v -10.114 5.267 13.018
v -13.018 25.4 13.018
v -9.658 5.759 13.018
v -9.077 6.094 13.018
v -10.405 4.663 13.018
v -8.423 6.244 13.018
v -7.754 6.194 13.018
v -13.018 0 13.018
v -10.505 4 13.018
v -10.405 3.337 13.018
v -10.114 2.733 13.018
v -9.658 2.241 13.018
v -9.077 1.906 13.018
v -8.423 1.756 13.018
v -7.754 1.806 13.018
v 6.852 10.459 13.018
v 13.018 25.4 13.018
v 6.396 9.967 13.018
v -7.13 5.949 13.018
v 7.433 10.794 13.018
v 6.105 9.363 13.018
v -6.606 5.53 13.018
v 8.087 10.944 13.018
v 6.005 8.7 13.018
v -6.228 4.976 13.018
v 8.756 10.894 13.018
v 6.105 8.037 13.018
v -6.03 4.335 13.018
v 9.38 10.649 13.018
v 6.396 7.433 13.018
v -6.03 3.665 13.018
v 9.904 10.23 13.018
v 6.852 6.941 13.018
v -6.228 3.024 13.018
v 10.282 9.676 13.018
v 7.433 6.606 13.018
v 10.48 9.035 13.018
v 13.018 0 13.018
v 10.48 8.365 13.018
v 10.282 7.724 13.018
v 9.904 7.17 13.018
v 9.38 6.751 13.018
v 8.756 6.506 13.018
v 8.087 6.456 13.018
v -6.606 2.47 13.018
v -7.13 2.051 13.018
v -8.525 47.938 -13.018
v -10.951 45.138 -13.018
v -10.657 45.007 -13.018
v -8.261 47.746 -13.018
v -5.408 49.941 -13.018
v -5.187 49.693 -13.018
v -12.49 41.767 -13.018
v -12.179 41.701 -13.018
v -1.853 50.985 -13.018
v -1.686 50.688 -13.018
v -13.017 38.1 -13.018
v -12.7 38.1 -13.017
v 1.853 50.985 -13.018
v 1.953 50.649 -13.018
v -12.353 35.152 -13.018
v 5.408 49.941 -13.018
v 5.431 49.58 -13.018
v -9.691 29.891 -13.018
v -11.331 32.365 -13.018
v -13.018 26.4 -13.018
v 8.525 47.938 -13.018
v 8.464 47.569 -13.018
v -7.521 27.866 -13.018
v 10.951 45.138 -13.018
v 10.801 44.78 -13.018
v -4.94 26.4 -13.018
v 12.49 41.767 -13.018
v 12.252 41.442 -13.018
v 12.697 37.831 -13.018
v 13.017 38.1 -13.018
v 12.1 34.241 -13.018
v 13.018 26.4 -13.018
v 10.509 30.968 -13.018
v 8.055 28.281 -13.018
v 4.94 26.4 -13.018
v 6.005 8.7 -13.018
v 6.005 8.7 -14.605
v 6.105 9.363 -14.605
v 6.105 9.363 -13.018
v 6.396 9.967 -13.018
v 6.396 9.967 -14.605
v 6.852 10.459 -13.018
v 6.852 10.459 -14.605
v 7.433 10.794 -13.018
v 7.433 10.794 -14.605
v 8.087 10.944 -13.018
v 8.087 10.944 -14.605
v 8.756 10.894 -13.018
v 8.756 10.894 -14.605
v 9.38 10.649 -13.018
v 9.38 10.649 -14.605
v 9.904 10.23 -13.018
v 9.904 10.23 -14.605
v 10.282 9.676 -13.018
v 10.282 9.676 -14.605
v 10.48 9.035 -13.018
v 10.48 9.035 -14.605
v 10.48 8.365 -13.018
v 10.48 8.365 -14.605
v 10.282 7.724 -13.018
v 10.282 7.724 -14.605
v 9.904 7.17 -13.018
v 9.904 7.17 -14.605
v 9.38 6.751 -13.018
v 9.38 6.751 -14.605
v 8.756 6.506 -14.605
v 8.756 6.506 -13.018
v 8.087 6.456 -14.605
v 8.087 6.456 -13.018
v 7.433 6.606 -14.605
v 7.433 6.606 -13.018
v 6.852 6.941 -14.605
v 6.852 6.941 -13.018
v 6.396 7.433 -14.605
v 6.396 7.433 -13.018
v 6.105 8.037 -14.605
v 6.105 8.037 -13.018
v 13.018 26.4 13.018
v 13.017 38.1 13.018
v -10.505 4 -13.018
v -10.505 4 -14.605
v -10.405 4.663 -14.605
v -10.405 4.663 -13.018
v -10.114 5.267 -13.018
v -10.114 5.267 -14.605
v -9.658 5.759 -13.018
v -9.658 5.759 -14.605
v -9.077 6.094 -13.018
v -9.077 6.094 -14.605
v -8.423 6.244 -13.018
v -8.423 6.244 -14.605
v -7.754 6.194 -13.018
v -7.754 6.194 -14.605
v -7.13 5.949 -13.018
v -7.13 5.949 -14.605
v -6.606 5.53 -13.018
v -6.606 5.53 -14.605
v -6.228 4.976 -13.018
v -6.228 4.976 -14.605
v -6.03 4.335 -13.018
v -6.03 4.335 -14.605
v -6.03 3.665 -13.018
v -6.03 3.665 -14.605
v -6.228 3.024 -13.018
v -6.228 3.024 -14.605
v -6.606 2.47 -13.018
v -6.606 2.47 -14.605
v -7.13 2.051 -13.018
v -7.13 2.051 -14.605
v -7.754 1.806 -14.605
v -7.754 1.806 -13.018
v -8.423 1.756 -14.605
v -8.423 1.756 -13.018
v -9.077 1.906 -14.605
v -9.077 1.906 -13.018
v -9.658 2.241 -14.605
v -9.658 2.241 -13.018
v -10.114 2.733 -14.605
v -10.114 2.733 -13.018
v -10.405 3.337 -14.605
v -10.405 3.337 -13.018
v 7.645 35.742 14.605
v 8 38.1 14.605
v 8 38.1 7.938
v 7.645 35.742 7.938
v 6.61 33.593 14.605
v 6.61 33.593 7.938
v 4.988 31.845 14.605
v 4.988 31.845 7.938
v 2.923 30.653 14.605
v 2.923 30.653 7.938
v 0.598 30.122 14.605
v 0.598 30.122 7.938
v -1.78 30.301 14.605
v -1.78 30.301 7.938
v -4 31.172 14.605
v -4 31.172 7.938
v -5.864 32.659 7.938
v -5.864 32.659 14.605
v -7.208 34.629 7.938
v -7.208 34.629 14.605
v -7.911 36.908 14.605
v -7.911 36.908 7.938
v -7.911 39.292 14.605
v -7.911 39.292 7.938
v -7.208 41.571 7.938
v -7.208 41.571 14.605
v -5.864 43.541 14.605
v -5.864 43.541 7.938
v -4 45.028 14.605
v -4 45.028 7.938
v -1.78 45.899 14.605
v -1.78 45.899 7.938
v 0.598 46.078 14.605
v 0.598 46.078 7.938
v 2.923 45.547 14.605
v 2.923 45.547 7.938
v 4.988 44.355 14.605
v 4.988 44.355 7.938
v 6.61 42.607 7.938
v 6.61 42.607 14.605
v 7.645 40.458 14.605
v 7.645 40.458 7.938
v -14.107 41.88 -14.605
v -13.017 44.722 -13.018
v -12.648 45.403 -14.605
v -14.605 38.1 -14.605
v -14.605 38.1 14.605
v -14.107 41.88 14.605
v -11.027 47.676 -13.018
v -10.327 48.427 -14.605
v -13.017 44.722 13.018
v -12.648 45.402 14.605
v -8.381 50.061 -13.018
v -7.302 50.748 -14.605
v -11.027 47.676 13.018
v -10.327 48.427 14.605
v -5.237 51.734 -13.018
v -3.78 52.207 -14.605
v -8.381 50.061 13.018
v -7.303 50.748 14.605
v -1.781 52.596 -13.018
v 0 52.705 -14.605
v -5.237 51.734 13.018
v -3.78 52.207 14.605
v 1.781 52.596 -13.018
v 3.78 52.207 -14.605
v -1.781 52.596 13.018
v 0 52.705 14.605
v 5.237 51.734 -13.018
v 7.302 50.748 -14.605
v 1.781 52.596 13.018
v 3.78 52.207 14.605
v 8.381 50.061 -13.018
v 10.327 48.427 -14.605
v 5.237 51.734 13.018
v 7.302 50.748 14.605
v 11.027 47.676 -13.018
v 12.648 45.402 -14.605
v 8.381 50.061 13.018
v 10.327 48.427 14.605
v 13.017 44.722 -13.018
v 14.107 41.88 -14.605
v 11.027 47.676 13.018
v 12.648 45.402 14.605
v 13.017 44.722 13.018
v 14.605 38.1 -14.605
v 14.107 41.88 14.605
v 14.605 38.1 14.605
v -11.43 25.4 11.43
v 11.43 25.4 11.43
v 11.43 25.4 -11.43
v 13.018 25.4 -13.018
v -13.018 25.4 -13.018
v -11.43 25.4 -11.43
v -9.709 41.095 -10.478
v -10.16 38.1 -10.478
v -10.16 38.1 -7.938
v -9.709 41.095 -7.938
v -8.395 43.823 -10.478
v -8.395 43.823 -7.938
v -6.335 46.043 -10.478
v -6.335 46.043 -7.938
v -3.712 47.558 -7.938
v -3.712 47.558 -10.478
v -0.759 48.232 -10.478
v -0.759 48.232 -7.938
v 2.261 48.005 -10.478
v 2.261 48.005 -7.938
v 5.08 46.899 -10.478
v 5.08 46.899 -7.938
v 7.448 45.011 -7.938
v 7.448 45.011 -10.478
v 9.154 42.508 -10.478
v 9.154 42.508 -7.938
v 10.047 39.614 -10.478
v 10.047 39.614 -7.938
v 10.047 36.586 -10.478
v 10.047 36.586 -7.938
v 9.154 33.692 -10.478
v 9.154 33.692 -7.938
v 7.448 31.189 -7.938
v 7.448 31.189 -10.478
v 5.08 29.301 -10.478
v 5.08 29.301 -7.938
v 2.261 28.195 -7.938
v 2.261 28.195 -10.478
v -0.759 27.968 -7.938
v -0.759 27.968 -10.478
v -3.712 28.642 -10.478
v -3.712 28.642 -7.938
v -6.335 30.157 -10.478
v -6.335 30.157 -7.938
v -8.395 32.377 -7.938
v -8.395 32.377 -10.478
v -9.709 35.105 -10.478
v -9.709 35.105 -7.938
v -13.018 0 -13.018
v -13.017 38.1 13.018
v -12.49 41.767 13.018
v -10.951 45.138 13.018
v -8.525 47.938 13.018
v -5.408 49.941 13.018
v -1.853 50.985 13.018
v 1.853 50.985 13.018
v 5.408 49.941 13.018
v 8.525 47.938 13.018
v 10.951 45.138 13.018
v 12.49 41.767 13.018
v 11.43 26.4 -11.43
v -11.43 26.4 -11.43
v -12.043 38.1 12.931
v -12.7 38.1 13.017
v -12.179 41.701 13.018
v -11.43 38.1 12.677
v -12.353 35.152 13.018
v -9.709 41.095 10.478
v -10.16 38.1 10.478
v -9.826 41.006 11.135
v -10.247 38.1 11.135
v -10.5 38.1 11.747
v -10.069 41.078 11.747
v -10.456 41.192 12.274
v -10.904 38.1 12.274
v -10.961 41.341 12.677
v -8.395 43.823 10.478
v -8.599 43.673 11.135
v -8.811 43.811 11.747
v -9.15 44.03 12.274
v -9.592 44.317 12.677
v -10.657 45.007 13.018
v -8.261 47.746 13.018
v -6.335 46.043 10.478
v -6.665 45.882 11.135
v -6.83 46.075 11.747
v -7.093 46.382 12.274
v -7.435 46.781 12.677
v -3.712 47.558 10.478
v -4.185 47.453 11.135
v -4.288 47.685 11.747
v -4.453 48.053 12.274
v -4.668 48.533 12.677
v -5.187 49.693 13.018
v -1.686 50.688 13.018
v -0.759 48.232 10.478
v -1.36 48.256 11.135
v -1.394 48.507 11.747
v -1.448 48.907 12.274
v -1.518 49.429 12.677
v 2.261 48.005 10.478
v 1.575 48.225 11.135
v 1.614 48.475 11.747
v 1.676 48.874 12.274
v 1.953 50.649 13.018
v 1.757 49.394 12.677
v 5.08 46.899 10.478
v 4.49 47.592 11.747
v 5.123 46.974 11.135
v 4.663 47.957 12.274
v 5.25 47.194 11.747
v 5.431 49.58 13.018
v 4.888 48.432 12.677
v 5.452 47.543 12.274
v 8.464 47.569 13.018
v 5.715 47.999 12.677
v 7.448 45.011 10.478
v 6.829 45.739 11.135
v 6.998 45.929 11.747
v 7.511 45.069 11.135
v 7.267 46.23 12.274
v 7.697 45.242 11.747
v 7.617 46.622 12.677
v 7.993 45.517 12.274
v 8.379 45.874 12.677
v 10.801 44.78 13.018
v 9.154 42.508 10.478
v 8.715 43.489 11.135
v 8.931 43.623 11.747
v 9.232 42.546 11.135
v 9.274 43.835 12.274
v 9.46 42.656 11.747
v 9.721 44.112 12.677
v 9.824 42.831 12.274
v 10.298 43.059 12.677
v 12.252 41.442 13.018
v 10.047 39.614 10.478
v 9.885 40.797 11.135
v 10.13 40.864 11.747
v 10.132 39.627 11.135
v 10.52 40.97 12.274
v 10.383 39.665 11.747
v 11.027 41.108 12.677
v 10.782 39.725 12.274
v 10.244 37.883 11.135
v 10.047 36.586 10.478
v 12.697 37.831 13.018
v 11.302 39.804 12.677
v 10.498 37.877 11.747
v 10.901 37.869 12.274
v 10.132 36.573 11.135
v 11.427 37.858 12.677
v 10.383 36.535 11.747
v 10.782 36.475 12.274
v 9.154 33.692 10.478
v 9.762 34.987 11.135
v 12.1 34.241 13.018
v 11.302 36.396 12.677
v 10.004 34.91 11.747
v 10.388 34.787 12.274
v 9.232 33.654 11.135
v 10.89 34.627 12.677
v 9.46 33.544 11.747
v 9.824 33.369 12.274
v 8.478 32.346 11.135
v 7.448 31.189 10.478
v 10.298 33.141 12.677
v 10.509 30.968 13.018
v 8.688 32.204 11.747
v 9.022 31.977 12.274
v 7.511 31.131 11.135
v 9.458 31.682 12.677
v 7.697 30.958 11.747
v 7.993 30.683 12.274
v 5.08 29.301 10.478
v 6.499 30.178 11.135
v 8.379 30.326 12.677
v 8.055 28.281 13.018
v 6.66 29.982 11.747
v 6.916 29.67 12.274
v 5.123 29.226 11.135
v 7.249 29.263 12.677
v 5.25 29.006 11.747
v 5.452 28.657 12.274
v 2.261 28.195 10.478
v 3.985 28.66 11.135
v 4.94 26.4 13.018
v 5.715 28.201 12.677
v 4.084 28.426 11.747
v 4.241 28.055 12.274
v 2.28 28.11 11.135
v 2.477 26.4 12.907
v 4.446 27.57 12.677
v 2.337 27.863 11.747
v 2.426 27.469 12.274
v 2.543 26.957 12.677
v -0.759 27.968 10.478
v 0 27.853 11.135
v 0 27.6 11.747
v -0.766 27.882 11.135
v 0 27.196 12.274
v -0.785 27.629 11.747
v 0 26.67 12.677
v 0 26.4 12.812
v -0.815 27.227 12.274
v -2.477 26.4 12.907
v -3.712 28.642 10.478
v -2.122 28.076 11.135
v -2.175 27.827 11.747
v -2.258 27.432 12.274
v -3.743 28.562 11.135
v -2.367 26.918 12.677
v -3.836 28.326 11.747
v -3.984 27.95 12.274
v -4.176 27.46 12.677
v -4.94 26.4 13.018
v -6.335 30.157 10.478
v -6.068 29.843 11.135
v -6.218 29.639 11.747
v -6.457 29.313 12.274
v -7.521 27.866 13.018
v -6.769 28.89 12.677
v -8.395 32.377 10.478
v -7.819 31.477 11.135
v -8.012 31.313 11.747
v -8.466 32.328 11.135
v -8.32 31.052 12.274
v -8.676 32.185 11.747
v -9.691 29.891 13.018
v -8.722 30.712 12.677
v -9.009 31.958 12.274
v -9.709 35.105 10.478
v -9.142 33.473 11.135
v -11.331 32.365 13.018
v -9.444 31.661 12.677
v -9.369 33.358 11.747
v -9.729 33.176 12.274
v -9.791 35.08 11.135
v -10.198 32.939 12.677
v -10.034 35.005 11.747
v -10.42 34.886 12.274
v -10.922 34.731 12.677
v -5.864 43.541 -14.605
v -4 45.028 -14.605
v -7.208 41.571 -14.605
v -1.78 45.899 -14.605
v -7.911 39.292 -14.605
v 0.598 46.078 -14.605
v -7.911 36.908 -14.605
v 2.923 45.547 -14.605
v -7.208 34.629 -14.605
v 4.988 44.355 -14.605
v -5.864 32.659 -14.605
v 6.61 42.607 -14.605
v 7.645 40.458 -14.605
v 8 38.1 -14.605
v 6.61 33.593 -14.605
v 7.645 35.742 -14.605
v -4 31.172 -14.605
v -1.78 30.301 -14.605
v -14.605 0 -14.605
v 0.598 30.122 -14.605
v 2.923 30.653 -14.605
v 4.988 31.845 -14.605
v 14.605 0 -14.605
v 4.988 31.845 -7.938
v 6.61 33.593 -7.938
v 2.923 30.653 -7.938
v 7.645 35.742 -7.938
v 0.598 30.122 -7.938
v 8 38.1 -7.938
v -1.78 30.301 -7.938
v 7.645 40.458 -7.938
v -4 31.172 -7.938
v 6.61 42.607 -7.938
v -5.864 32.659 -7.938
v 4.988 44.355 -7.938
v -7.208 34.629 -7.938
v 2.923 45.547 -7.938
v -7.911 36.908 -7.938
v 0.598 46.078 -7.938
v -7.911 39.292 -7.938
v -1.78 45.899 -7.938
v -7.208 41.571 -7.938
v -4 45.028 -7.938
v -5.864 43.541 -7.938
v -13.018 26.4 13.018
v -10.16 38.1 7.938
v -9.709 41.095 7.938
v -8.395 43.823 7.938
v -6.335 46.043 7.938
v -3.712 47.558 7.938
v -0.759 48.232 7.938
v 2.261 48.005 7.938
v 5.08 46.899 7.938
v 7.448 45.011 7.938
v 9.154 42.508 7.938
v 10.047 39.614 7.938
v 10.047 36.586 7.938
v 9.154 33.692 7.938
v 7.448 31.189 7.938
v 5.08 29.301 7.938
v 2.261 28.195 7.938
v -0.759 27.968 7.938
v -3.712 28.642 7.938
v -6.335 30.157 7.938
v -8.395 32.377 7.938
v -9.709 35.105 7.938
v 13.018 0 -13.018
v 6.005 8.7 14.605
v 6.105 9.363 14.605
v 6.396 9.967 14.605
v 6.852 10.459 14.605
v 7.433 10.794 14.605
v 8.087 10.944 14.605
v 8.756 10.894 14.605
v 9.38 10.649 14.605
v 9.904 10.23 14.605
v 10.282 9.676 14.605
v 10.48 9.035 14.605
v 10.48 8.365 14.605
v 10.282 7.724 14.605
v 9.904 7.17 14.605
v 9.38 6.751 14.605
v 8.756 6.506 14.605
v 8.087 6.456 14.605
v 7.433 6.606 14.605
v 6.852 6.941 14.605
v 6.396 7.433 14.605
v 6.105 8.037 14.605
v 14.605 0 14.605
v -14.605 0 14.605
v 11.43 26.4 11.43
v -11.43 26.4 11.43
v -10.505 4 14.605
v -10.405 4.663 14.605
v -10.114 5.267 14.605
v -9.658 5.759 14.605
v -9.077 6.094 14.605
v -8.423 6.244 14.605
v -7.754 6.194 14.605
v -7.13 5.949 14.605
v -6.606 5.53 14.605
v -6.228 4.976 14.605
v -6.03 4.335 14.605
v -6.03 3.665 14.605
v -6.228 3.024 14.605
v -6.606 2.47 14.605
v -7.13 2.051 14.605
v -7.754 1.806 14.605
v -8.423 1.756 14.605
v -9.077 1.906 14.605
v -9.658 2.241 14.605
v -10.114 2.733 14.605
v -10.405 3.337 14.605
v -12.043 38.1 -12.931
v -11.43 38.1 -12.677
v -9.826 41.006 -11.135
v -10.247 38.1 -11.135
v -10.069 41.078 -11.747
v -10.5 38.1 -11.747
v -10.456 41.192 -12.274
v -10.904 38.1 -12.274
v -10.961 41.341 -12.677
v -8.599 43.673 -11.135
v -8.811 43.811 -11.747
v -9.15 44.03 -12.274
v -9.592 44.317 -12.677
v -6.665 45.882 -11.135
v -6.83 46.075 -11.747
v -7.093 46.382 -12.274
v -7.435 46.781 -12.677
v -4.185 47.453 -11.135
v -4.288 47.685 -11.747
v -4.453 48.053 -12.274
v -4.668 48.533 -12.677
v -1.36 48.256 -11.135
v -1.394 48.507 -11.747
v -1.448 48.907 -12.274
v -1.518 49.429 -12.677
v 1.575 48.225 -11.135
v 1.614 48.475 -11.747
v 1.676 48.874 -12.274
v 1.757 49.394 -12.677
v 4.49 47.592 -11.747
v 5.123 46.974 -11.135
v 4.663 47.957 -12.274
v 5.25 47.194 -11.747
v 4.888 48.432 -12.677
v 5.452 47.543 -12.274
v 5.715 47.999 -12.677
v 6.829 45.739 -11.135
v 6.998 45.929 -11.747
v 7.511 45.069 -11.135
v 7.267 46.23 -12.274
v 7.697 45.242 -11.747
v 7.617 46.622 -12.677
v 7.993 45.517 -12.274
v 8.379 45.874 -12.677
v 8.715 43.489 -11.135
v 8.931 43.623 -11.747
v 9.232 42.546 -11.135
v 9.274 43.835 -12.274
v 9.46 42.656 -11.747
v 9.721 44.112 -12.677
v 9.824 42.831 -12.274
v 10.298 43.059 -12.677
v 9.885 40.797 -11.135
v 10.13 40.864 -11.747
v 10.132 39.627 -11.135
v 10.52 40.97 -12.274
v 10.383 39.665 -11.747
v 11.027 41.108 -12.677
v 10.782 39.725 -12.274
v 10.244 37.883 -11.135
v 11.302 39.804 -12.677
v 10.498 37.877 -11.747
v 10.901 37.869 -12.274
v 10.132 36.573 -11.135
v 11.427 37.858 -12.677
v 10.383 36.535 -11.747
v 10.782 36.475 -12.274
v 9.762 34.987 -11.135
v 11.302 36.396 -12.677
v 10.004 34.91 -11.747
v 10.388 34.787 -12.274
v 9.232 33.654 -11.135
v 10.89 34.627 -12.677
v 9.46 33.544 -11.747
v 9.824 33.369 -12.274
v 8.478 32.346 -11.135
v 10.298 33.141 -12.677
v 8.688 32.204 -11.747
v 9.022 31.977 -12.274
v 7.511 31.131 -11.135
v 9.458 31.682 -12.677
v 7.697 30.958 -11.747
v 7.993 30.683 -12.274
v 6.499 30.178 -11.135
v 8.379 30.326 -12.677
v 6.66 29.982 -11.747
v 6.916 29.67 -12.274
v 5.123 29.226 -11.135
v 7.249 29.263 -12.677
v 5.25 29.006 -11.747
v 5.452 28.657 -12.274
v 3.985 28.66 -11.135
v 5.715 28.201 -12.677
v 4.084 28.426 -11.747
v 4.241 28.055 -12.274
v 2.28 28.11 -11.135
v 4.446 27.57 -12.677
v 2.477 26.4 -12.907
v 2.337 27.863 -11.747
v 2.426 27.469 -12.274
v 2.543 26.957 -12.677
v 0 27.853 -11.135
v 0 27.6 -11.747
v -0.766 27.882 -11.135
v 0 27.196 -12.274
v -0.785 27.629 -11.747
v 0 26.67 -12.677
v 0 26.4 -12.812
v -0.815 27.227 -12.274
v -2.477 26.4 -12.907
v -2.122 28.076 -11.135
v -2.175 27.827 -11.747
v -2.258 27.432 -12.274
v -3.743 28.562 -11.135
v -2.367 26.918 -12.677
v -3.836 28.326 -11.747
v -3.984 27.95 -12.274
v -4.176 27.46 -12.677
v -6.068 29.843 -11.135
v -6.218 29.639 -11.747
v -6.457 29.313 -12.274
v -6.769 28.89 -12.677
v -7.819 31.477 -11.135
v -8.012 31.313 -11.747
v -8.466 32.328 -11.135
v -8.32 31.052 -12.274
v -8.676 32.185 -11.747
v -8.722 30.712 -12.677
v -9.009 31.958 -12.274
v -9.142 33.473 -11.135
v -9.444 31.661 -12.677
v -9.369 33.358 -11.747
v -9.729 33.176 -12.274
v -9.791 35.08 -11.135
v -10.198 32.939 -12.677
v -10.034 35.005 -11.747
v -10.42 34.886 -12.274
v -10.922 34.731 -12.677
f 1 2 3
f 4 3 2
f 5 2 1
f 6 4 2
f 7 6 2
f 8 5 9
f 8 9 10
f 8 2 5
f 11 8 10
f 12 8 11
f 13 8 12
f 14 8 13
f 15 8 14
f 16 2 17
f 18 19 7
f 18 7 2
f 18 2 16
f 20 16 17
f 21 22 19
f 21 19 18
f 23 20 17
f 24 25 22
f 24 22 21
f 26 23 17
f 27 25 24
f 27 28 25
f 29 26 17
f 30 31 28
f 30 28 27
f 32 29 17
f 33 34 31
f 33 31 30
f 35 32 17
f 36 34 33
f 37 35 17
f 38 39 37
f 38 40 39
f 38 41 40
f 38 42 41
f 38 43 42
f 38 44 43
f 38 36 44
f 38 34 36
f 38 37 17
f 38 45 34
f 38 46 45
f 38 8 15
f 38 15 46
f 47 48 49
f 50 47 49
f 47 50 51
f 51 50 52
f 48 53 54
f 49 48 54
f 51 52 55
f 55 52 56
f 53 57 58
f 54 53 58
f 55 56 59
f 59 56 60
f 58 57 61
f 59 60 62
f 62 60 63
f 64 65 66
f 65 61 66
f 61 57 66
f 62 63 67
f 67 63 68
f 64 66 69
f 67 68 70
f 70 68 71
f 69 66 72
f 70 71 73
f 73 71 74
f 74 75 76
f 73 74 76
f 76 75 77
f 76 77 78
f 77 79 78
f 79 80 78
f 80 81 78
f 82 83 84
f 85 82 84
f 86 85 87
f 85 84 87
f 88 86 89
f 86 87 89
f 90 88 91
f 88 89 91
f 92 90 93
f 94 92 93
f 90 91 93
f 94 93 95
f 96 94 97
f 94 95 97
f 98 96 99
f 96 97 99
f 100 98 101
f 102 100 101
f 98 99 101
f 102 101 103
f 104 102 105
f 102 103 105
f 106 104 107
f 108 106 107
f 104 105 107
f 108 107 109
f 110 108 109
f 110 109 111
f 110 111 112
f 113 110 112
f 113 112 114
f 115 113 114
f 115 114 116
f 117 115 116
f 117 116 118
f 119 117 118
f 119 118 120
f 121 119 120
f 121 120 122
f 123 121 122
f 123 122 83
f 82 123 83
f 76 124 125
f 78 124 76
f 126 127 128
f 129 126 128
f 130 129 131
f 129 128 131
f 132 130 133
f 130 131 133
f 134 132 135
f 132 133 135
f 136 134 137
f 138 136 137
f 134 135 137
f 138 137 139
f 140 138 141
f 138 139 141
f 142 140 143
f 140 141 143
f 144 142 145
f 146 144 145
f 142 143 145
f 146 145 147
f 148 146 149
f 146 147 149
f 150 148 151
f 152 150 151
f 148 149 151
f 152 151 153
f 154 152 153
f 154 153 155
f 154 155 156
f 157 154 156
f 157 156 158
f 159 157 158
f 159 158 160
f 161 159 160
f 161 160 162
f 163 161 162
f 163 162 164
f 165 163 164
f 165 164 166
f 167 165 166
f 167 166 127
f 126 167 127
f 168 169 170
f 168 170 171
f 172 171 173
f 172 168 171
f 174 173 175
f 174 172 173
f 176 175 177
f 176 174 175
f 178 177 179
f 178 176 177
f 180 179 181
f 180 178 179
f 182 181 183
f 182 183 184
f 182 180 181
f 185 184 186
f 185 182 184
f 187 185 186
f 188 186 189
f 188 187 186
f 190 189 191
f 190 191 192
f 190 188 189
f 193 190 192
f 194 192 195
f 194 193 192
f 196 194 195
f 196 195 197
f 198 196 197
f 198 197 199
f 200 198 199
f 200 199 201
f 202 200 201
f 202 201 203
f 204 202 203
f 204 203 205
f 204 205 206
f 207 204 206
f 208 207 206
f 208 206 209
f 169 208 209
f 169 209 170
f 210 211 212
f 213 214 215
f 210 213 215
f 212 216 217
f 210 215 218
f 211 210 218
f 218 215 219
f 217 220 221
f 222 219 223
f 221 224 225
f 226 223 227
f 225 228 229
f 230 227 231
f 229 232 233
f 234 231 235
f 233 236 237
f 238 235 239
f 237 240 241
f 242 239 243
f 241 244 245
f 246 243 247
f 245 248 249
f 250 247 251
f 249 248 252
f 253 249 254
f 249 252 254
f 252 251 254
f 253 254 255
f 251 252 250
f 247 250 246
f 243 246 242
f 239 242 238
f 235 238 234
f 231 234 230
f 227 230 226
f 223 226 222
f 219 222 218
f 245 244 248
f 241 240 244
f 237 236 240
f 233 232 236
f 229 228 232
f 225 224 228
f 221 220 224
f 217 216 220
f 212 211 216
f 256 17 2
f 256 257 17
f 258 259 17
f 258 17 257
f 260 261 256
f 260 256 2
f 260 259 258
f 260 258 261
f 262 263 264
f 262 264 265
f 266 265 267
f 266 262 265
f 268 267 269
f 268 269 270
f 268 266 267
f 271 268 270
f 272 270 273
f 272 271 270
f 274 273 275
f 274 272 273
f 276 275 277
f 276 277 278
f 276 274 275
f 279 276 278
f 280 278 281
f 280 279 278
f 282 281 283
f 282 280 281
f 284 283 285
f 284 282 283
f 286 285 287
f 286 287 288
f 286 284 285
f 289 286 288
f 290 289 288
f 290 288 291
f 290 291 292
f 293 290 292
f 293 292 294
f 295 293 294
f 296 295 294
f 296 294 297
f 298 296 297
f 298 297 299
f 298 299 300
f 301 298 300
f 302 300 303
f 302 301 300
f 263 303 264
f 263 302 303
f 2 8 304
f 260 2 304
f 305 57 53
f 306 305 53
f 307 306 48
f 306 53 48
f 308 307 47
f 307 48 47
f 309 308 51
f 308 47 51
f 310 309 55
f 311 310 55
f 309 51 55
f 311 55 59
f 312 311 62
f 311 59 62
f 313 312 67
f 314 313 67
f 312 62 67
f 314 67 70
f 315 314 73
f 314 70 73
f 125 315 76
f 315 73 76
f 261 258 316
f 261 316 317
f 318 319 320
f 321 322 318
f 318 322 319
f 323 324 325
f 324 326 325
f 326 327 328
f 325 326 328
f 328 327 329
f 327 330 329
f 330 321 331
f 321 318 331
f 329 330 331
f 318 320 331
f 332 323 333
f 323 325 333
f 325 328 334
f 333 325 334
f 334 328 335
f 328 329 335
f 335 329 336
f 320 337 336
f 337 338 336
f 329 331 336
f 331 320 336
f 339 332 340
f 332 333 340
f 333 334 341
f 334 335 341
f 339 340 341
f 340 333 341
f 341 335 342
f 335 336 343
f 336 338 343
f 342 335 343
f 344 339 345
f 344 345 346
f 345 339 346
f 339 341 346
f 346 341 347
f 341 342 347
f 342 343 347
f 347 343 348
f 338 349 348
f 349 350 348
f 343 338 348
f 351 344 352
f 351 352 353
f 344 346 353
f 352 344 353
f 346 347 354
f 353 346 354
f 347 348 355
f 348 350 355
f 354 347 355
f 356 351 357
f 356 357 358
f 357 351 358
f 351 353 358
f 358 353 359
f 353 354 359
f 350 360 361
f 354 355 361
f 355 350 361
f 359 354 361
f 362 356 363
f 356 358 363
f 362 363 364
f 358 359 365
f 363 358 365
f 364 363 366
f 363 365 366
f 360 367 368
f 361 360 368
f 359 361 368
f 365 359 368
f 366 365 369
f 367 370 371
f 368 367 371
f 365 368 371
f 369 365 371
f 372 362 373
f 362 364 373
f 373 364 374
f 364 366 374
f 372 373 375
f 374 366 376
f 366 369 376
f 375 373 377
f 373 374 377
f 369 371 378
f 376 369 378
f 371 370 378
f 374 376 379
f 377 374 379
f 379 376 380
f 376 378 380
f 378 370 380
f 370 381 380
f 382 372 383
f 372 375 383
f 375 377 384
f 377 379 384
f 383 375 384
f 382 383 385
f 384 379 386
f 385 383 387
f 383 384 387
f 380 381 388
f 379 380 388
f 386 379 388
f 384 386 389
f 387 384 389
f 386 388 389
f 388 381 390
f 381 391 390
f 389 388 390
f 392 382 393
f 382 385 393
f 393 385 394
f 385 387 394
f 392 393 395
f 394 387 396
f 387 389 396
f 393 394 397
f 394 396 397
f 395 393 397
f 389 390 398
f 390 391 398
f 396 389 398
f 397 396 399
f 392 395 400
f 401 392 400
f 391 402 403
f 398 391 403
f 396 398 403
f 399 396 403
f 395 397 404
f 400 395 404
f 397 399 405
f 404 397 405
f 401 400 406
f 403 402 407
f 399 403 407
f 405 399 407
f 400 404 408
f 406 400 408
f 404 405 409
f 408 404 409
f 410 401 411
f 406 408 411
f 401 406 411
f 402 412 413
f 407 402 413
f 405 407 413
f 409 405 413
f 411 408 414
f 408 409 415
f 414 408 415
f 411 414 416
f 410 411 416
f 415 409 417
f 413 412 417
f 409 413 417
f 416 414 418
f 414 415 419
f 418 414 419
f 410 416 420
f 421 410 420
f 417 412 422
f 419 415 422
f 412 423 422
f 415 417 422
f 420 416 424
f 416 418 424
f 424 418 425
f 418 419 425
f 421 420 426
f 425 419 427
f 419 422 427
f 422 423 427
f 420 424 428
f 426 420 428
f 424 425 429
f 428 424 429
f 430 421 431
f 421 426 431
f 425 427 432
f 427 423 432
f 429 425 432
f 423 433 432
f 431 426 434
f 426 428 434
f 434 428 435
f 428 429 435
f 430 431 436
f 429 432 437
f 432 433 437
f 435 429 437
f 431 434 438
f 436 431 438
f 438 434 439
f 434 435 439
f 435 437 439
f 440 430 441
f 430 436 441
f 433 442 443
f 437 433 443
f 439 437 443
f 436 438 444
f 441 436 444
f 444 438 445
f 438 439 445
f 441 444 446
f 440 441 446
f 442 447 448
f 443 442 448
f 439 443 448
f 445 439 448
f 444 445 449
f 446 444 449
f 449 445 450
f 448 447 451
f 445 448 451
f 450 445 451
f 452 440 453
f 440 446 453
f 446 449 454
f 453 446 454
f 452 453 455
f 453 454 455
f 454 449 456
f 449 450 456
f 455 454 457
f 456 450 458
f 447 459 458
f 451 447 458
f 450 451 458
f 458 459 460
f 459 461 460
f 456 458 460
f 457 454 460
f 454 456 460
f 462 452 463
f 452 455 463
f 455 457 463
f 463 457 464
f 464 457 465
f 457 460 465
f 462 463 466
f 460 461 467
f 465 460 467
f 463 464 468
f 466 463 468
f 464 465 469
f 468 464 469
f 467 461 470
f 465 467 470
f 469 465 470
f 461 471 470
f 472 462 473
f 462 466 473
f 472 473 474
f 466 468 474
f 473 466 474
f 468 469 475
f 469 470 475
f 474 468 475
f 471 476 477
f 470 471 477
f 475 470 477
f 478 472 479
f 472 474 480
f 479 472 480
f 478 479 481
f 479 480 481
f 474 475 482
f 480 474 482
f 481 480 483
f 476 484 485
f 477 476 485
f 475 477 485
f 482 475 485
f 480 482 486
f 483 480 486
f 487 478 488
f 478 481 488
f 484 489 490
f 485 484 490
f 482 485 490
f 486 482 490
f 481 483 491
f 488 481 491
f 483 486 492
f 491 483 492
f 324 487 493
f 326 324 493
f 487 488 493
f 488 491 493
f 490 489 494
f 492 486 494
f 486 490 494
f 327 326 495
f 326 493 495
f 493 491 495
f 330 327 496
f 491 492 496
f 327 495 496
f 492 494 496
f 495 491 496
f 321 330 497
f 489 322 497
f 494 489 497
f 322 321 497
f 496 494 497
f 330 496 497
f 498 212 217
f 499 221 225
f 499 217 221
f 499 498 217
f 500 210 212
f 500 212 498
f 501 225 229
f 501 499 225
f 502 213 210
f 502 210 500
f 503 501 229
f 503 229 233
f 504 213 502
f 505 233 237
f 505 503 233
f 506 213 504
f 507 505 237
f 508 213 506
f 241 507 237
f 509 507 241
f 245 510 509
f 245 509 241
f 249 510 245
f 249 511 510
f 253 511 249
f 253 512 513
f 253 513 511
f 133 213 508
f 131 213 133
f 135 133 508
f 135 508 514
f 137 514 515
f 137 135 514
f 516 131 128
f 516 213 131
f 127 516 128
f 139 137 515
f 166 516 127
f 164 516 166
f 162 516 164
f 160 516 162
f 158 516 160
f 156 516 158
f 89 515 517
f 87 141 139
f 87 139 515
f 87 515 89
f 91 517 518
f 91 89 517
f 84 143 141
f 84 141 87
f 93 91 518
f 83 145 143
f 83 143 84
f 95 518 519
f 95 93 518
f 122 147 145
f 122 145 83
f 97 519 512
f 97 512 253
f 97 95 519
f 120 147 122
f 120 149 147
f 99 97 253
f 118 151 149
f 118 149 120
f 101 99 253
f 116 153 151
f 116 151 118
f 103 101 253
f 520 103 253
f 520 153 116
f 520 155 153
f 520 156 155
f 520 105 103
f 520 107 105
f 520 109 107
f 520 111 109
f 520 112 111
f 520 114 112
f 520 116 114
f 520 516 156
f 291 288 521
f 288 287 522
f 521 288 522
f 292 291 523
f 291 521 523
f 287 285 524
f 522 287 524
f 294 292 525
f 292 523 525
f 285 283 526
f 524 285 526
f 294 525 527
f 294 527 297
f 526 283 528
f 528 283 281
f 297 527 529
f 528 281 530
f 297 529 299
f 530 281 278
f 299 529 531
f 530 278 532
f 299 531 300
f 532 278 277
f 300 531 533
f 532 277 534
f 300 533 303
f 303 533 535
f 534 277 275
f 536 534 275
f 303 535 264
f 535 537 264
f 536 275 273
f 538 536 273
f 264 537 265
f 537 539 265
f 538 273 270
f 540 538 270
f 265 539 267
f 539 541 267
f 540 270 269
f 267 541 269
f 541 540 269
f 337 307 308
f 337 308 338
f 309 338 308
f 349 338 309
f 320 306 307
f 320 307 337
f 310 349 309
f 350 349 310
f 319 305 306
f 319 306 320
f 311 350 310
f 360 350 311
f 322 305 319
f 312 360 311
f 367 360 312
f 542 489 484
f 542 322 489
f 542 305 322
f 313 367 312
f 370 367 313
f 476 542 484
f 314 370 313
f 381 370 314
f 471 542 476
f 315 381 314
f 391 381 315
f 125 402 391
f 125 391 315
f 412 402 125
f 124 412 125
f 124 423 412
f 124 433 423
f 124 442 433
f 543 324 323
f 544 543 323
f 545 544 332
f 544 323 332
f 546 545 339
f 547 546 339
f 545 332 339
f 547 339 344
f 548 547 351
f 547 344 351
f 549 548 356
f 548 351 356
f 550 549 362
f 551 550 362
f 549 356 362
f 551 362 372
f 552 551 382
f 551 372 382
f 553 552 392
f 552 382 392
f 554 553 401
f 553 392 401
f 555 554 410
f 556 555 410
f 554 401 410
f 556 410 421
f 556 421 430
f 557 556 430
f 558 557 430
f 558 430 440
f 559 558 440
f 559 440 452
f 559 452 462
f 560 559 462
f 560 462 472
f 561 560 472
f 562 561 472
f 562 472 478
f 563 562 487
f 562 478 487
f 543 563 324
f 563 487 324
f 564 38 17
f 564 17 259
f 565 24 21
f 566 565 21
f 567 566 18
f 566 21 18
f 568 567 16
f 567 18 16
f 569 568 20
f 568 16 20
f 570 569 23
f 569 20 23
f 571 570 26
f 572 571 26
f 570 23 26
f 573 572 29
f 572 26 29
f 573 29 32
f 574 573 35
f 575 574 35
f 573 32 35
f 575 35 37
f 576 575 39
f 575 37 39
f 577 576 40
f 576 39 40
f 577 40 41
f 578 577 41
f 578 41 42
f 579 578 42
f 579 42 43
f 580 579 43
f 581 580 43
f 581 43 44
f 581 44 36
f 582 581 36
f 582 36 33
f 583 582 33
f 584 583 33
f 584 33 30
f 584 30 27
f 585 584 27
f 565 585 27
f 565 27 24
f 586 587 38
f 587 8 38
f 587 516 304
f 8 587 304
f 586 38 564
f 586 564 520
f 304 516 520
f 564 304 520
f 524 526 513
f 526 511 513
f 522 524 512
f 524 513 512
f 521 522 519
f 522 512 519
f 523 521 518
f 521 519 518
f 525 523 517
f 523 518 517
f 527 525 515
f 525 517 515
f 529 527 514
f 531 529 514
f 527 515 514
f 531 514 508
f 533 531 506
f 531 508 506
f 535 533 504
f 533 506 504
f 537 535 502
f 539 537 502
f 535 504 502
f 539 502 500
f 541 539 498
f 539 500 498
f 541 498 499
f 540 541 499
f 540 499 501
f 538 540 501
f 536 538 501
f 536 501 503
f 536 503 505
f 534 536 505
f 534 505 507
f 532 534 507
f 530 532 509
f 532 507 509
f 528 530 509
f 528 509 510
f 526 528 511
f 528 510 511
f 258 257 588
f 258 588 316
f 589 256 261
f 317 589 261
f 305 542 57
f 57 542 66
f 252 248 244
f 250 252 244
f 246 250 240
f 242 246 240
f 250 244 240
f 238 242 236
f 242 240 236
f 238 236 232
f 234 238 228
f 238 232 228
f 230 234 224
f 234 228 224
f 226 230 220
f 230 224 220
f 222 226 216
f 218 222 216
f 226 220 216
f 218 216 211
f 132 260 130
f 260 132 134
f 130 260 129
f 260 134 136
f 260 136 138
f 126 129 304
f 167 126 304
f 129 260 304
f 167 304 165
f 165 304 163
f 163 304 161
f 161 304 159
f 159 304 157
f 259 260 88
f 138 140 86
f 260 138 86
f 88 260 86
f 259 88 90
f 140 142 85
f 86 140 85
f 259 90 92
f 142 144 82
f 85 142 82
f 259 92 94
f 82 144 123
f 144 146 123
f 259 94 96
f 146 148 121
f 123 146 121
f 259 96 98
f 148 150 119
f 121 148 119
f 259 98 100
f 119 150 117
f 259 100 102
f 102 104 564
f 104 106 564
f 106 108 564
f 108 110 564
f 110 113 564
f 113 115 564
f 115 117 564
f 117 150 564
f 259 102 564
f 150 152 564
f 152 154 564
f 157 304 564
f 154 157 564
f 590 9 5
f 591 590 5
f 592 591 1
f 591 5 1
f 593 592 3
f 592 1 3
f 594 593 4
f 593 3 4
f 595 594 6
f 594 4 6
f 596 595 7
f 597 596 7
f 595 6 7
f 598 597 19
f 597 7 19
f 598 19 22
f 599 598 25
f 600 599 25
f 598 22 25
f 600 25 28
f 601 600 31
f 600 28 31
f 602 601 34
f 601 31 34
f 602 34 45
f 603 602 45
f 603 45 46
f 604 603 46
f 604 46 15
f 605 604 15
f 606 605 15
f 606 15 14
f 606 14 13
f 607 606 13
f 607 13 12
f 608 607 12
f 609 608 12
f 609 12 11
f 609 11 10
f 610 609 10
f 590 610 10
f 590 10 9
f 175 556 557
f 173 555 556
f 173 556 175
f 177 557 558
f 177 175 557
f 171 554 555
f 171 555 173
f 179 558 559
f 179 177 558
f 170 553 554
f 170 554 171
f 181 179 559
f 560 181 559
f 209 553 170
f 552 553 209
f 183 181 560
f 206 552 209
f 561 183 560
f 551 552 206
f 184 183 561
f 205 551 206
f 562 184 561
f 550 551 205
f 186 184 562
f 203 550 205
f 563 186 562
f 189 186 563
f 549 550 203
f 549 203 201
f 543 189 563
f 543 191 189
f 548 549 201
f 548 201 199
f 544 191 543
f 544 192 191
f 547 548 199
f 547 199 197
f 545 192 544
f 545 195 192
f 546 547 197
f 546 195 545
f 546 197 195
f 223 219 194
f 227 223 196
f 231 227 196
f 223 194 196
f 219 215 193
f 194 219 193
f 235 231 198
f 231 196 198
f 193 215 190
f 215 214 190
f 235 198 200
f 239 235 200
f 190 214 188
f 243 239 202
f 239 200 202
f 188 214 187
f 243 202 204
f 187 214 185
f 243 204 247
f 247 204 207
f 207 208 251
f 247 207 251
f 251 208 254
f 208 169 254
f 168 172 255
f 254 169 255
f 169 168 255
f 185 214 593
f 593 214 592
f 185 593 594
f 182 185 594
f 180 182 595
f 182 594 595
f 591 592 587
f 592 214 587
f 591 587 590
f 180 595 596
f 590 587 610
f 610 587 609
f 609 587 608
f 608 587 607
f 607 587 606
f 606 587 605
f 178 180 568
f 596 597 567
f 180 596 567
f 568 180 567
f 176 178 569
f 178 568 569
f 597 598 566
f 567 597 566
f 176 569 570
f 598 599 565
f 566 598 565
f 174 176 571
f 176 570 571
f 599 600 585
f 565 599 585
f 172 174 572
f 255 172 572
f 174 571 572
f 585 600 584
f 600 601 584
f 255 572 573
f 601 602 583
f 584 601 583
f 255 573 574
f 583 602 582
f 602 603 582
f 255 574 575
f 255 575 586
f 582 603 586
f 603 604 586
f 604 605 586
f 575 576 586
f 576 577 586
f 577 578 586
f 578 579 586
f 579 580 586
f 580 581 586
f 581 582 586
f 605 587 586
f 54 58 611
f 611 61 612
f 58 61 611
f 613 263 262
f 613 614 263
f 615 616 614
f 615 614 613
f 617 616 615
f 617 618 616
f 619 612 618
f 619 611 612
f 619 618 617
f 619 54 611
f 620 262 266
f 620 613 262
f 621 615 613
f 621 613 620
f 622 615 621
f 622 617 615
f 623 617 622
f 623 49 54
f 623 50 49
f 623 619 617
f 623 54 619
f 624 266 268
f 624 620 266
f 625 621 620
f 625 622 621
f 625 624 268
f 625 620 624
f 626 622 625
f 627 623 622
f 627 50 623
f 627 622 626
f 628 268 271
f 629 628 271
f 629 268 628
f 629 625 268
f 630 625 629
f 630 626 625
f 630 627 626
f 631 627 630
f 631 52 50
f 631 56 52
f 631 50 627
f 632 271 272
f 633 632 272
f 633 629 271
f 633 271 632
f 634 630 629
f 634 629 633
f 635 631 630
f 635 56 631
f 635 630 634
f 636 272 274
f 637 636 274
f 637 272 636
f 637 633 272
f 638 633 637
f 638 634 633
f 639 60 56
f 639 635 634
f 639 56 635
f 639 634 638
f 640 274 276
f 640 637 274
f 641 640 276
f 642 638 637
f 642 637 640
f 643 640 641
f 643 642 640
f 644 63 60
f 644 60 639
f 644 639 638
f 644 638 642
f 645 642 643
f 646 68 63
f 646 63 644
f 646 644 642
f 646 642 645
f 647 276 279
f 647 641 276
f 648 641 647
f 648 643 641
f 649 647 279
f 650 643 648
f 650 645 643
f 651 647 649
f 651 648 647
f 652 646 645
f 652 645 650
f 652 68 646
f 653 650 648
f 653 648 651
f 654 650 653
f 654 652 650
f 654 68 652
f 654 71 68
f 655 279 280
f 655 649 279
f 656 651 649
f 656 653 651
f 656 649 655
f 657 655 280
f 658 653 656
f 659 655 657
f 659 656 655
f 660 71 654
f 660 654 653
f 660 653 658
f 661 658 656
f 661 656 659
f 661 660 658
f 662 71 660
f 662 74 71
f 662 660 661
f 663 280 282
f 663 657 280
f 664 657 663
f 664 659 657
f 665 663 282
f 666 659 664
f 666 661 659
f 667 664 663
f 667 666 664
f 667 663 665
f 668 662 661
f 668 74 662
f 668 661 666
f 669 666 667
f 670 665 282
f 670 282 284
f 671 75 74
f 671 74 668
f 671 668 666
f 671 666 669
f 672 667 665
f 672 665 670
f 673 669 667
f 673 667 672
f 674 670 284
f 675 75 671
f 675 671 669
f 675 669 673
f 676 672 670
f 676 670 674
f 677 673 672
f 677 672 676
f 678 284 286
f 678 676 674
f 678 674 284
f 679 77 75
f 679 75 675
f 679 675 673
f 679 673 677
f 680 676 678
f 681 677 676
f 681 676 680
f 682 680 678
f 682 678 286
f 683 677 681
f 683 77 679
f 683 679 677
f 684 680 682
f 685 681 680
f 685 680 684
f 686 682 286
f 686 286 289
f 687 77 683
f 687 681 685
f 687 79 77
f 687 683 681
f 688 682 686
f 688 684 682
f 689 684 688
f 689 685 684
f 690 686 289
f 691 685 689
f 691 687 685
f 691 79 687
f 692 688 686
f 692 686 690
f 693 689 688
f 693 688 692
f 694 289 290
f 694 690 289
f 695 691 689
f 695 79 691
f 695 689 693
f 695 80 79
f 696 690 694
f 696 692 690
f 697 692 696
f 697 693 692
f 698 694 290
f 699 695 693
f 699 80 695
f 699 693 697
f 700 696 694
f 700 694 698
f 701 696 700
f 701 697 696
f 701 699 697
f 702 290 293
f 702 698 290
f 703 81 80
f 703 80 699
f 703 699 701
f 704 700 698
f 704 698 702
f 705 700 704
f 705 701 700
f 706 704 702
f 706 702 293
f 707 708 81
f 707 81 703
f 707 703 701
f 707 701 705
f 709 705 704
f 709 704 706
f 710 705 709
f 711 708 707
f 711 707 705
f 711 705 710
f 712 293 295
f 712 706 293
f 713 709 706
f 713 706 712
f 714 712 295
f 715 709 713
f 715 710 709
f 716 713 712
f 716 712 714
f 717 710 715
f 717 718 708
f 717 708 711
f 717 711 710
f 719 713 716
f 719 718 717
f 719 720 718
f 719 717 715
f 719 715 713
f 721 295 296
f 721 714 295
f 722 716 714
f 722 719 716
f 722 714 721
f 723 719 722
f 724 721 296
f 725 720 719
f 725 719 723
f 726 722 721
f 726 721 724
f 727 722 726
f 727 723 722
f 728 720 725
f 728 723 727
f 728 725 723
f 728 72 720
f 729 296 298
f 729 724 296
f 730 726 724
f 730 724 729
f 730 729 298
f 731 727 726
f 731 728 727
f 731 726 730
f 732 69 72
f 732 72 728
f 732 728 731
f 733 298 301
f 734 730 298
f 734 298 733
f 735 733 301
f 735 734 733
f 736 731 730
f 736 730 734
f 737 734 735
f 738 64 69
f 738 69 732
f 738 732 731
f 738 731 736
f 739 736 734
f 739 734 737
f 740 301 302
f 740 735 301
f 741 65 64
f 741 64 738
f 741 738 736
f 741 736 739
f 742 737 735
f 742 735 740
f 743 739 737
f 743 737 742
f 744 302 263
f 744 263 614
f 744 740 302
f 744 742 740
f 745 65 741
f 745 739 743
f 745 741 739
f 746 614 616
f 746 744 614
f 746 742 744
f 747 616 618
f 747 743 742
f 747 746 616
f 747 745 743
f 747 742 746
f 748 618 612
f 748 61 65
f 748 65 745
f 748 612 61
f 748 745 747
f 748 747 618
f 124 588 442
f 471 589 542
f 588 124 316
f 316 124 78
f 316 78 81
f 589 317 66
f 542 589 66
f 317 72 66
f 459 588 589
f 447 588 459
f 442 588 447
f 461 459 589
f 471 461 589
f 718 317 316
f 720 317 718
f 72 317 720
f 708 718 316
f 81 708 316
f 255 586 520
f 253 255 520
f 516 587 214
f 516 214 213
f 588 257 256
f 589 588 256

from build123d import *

# Parameters (mm, degrees)
SKETCH1_W           = 29.21
SKETCH1_H           = 29.21
SKETCH1_W_2         = 26.035
SKETCH1_H_2         = 26.035
BOSS_EXTRUDE1_DEPTH = 101.6
SKETCH2_R           = 8
CUT_EXTRUDE1_DEPTH  = 50.8
BOSS_EXTRUDE2_DEPTH = 26.035
SKETCH6_R           = 10.16
SKETCH6_R_2         = 8
BOSS_EXTRUDE3_DEPTH = 5.08
FILLET1_R           = 2.54
SKETCH7_R           = 2.25
CUT_EXTRUDE2_DEPTH  = 46.736
SKETCH8_W           = 26.035
SKETCH8_H           = 26.035
SKETCH8_W_2         = 22.86
SKETCH8_H_2         = 22.86
BOSS_EXTRUDE4_DEPTH = 1


with BuildPart() as part:
    # Sketch1 → Boss-Extrude1 (new body)
    with BuildSketch(Plane(origin=(0, 0, 0), x_dir=(1, 0, 0), z_dir=(0, 1, 0))):
        Rectangle(SKETCH1_W, SKETCH1_H)
        Rectangle(SKETCH1_W_2, SKETCH1_H_2, mode=Mode.SUBTRACT)
    extrude(amount=BOSS_EXTRUDE1_DEPTH)

    # Sketch2 → Cut-Extrude1 (cut)
    with BuildSketch(Plane.XY.offset(14.605)):
        with BuildLine():
            Line((-14.605, 101.6), (-14.605, 38.1))
            ThreePointArc((-14.605, 38.1), (0, 52.705), (14.605, 38.1))
            Line((14.605, 38.1), (14.605, 101.6))
            Line((14.605, 101.6), (-14.605, 101.6))
        make_face()
        with Locations((0, 38.1)):
            Circle(SKETCH2_R)
    extrude(amount=-CUT_EXTRUDE1_DEPTH, mode=Mode.SUBTRACT)

    # Sketch5 → Boss-Extrude2 (add)
    with BuildSketch(Plane.XY.offset(-13.0175)):
        with BuildLine():
            Line((-13.0175, 44.721987523), (-13.0175, 38.1))
            ThreePointArc((-13.0175, 38.1), (0, 51.1175), (13.0175, 38.1))
            Line((13.0175, 38.1), (13.0175, 44.721987523))
            ThreePointArc((13.0175, 44.721987523), (0, 52.705), (-13.0175, 44.721987523))
        make_face()
    extrude(amount=BOSS_EXTRUDE2_DEPTH)

    # Sketch6 → Boss-Extrude3 (add)
    with BuildSketch(Plane(origin=(0, 0, 13.0175), x_dir=(-1, 0, 0), z_dir=(0, 0, -1))):
        with Locations((0, 38.1)):
            Circle(SKETCH6_R)
        with Locations(Location((0, 38.1, 0), (0, 0, 180))):
            Circle(SKETCH6_R_2, mode=Mode.SUBTRACT)
    extrude(amount=BOSS_EXTRUDE3_DEPTH)

    # Fillet1
    fillet1_edges = [part.edges().sort_by_distance(p)[0] for p in [
        (10.16, 38.1, 13.0175),
    ]]
    fillet(fillet1_edges, radius=FILLET1_R)

    # Mirror7: part across plane


with BuildPart() as part_1:
    add(part.part)
    add(part.part.mirror(Plane.XY))

    # Sketch7 → Cut-Extrude2 (cut)
    with BuildSketch(Plane(origin=(0, 0, -14.605), x_dir=(-1, 0, 0), z_dir=(0, 0, -1))):
        with Locations((-8.255, 8.7)):
            Circle(SKETCH7_R)
        with Locations((8.255, 4)):
            Circle(SKETCH7_R)
    extrude(amount=-CUT_EXTRUDE2_DEPTH, mode=Mode.SUBTRACT)

    # Sketch8 → Boss-Extrude4 (add)
    with BuildSketch(Plane(origin=(0, 25.4, 0), x_dir=(-1, 0, 0), z_dir=(0, -1, 0))):
        Rectangle(SKETCH8_W, SKETCH8_H)
        Rectangle(SKETCH8_W_2, SKETCH8_H_2, mode=Mode.SUBTRACT)
    extrude(amount=-BOSS_EXTRUDE4_DEPTH)


solid = part_1.part
